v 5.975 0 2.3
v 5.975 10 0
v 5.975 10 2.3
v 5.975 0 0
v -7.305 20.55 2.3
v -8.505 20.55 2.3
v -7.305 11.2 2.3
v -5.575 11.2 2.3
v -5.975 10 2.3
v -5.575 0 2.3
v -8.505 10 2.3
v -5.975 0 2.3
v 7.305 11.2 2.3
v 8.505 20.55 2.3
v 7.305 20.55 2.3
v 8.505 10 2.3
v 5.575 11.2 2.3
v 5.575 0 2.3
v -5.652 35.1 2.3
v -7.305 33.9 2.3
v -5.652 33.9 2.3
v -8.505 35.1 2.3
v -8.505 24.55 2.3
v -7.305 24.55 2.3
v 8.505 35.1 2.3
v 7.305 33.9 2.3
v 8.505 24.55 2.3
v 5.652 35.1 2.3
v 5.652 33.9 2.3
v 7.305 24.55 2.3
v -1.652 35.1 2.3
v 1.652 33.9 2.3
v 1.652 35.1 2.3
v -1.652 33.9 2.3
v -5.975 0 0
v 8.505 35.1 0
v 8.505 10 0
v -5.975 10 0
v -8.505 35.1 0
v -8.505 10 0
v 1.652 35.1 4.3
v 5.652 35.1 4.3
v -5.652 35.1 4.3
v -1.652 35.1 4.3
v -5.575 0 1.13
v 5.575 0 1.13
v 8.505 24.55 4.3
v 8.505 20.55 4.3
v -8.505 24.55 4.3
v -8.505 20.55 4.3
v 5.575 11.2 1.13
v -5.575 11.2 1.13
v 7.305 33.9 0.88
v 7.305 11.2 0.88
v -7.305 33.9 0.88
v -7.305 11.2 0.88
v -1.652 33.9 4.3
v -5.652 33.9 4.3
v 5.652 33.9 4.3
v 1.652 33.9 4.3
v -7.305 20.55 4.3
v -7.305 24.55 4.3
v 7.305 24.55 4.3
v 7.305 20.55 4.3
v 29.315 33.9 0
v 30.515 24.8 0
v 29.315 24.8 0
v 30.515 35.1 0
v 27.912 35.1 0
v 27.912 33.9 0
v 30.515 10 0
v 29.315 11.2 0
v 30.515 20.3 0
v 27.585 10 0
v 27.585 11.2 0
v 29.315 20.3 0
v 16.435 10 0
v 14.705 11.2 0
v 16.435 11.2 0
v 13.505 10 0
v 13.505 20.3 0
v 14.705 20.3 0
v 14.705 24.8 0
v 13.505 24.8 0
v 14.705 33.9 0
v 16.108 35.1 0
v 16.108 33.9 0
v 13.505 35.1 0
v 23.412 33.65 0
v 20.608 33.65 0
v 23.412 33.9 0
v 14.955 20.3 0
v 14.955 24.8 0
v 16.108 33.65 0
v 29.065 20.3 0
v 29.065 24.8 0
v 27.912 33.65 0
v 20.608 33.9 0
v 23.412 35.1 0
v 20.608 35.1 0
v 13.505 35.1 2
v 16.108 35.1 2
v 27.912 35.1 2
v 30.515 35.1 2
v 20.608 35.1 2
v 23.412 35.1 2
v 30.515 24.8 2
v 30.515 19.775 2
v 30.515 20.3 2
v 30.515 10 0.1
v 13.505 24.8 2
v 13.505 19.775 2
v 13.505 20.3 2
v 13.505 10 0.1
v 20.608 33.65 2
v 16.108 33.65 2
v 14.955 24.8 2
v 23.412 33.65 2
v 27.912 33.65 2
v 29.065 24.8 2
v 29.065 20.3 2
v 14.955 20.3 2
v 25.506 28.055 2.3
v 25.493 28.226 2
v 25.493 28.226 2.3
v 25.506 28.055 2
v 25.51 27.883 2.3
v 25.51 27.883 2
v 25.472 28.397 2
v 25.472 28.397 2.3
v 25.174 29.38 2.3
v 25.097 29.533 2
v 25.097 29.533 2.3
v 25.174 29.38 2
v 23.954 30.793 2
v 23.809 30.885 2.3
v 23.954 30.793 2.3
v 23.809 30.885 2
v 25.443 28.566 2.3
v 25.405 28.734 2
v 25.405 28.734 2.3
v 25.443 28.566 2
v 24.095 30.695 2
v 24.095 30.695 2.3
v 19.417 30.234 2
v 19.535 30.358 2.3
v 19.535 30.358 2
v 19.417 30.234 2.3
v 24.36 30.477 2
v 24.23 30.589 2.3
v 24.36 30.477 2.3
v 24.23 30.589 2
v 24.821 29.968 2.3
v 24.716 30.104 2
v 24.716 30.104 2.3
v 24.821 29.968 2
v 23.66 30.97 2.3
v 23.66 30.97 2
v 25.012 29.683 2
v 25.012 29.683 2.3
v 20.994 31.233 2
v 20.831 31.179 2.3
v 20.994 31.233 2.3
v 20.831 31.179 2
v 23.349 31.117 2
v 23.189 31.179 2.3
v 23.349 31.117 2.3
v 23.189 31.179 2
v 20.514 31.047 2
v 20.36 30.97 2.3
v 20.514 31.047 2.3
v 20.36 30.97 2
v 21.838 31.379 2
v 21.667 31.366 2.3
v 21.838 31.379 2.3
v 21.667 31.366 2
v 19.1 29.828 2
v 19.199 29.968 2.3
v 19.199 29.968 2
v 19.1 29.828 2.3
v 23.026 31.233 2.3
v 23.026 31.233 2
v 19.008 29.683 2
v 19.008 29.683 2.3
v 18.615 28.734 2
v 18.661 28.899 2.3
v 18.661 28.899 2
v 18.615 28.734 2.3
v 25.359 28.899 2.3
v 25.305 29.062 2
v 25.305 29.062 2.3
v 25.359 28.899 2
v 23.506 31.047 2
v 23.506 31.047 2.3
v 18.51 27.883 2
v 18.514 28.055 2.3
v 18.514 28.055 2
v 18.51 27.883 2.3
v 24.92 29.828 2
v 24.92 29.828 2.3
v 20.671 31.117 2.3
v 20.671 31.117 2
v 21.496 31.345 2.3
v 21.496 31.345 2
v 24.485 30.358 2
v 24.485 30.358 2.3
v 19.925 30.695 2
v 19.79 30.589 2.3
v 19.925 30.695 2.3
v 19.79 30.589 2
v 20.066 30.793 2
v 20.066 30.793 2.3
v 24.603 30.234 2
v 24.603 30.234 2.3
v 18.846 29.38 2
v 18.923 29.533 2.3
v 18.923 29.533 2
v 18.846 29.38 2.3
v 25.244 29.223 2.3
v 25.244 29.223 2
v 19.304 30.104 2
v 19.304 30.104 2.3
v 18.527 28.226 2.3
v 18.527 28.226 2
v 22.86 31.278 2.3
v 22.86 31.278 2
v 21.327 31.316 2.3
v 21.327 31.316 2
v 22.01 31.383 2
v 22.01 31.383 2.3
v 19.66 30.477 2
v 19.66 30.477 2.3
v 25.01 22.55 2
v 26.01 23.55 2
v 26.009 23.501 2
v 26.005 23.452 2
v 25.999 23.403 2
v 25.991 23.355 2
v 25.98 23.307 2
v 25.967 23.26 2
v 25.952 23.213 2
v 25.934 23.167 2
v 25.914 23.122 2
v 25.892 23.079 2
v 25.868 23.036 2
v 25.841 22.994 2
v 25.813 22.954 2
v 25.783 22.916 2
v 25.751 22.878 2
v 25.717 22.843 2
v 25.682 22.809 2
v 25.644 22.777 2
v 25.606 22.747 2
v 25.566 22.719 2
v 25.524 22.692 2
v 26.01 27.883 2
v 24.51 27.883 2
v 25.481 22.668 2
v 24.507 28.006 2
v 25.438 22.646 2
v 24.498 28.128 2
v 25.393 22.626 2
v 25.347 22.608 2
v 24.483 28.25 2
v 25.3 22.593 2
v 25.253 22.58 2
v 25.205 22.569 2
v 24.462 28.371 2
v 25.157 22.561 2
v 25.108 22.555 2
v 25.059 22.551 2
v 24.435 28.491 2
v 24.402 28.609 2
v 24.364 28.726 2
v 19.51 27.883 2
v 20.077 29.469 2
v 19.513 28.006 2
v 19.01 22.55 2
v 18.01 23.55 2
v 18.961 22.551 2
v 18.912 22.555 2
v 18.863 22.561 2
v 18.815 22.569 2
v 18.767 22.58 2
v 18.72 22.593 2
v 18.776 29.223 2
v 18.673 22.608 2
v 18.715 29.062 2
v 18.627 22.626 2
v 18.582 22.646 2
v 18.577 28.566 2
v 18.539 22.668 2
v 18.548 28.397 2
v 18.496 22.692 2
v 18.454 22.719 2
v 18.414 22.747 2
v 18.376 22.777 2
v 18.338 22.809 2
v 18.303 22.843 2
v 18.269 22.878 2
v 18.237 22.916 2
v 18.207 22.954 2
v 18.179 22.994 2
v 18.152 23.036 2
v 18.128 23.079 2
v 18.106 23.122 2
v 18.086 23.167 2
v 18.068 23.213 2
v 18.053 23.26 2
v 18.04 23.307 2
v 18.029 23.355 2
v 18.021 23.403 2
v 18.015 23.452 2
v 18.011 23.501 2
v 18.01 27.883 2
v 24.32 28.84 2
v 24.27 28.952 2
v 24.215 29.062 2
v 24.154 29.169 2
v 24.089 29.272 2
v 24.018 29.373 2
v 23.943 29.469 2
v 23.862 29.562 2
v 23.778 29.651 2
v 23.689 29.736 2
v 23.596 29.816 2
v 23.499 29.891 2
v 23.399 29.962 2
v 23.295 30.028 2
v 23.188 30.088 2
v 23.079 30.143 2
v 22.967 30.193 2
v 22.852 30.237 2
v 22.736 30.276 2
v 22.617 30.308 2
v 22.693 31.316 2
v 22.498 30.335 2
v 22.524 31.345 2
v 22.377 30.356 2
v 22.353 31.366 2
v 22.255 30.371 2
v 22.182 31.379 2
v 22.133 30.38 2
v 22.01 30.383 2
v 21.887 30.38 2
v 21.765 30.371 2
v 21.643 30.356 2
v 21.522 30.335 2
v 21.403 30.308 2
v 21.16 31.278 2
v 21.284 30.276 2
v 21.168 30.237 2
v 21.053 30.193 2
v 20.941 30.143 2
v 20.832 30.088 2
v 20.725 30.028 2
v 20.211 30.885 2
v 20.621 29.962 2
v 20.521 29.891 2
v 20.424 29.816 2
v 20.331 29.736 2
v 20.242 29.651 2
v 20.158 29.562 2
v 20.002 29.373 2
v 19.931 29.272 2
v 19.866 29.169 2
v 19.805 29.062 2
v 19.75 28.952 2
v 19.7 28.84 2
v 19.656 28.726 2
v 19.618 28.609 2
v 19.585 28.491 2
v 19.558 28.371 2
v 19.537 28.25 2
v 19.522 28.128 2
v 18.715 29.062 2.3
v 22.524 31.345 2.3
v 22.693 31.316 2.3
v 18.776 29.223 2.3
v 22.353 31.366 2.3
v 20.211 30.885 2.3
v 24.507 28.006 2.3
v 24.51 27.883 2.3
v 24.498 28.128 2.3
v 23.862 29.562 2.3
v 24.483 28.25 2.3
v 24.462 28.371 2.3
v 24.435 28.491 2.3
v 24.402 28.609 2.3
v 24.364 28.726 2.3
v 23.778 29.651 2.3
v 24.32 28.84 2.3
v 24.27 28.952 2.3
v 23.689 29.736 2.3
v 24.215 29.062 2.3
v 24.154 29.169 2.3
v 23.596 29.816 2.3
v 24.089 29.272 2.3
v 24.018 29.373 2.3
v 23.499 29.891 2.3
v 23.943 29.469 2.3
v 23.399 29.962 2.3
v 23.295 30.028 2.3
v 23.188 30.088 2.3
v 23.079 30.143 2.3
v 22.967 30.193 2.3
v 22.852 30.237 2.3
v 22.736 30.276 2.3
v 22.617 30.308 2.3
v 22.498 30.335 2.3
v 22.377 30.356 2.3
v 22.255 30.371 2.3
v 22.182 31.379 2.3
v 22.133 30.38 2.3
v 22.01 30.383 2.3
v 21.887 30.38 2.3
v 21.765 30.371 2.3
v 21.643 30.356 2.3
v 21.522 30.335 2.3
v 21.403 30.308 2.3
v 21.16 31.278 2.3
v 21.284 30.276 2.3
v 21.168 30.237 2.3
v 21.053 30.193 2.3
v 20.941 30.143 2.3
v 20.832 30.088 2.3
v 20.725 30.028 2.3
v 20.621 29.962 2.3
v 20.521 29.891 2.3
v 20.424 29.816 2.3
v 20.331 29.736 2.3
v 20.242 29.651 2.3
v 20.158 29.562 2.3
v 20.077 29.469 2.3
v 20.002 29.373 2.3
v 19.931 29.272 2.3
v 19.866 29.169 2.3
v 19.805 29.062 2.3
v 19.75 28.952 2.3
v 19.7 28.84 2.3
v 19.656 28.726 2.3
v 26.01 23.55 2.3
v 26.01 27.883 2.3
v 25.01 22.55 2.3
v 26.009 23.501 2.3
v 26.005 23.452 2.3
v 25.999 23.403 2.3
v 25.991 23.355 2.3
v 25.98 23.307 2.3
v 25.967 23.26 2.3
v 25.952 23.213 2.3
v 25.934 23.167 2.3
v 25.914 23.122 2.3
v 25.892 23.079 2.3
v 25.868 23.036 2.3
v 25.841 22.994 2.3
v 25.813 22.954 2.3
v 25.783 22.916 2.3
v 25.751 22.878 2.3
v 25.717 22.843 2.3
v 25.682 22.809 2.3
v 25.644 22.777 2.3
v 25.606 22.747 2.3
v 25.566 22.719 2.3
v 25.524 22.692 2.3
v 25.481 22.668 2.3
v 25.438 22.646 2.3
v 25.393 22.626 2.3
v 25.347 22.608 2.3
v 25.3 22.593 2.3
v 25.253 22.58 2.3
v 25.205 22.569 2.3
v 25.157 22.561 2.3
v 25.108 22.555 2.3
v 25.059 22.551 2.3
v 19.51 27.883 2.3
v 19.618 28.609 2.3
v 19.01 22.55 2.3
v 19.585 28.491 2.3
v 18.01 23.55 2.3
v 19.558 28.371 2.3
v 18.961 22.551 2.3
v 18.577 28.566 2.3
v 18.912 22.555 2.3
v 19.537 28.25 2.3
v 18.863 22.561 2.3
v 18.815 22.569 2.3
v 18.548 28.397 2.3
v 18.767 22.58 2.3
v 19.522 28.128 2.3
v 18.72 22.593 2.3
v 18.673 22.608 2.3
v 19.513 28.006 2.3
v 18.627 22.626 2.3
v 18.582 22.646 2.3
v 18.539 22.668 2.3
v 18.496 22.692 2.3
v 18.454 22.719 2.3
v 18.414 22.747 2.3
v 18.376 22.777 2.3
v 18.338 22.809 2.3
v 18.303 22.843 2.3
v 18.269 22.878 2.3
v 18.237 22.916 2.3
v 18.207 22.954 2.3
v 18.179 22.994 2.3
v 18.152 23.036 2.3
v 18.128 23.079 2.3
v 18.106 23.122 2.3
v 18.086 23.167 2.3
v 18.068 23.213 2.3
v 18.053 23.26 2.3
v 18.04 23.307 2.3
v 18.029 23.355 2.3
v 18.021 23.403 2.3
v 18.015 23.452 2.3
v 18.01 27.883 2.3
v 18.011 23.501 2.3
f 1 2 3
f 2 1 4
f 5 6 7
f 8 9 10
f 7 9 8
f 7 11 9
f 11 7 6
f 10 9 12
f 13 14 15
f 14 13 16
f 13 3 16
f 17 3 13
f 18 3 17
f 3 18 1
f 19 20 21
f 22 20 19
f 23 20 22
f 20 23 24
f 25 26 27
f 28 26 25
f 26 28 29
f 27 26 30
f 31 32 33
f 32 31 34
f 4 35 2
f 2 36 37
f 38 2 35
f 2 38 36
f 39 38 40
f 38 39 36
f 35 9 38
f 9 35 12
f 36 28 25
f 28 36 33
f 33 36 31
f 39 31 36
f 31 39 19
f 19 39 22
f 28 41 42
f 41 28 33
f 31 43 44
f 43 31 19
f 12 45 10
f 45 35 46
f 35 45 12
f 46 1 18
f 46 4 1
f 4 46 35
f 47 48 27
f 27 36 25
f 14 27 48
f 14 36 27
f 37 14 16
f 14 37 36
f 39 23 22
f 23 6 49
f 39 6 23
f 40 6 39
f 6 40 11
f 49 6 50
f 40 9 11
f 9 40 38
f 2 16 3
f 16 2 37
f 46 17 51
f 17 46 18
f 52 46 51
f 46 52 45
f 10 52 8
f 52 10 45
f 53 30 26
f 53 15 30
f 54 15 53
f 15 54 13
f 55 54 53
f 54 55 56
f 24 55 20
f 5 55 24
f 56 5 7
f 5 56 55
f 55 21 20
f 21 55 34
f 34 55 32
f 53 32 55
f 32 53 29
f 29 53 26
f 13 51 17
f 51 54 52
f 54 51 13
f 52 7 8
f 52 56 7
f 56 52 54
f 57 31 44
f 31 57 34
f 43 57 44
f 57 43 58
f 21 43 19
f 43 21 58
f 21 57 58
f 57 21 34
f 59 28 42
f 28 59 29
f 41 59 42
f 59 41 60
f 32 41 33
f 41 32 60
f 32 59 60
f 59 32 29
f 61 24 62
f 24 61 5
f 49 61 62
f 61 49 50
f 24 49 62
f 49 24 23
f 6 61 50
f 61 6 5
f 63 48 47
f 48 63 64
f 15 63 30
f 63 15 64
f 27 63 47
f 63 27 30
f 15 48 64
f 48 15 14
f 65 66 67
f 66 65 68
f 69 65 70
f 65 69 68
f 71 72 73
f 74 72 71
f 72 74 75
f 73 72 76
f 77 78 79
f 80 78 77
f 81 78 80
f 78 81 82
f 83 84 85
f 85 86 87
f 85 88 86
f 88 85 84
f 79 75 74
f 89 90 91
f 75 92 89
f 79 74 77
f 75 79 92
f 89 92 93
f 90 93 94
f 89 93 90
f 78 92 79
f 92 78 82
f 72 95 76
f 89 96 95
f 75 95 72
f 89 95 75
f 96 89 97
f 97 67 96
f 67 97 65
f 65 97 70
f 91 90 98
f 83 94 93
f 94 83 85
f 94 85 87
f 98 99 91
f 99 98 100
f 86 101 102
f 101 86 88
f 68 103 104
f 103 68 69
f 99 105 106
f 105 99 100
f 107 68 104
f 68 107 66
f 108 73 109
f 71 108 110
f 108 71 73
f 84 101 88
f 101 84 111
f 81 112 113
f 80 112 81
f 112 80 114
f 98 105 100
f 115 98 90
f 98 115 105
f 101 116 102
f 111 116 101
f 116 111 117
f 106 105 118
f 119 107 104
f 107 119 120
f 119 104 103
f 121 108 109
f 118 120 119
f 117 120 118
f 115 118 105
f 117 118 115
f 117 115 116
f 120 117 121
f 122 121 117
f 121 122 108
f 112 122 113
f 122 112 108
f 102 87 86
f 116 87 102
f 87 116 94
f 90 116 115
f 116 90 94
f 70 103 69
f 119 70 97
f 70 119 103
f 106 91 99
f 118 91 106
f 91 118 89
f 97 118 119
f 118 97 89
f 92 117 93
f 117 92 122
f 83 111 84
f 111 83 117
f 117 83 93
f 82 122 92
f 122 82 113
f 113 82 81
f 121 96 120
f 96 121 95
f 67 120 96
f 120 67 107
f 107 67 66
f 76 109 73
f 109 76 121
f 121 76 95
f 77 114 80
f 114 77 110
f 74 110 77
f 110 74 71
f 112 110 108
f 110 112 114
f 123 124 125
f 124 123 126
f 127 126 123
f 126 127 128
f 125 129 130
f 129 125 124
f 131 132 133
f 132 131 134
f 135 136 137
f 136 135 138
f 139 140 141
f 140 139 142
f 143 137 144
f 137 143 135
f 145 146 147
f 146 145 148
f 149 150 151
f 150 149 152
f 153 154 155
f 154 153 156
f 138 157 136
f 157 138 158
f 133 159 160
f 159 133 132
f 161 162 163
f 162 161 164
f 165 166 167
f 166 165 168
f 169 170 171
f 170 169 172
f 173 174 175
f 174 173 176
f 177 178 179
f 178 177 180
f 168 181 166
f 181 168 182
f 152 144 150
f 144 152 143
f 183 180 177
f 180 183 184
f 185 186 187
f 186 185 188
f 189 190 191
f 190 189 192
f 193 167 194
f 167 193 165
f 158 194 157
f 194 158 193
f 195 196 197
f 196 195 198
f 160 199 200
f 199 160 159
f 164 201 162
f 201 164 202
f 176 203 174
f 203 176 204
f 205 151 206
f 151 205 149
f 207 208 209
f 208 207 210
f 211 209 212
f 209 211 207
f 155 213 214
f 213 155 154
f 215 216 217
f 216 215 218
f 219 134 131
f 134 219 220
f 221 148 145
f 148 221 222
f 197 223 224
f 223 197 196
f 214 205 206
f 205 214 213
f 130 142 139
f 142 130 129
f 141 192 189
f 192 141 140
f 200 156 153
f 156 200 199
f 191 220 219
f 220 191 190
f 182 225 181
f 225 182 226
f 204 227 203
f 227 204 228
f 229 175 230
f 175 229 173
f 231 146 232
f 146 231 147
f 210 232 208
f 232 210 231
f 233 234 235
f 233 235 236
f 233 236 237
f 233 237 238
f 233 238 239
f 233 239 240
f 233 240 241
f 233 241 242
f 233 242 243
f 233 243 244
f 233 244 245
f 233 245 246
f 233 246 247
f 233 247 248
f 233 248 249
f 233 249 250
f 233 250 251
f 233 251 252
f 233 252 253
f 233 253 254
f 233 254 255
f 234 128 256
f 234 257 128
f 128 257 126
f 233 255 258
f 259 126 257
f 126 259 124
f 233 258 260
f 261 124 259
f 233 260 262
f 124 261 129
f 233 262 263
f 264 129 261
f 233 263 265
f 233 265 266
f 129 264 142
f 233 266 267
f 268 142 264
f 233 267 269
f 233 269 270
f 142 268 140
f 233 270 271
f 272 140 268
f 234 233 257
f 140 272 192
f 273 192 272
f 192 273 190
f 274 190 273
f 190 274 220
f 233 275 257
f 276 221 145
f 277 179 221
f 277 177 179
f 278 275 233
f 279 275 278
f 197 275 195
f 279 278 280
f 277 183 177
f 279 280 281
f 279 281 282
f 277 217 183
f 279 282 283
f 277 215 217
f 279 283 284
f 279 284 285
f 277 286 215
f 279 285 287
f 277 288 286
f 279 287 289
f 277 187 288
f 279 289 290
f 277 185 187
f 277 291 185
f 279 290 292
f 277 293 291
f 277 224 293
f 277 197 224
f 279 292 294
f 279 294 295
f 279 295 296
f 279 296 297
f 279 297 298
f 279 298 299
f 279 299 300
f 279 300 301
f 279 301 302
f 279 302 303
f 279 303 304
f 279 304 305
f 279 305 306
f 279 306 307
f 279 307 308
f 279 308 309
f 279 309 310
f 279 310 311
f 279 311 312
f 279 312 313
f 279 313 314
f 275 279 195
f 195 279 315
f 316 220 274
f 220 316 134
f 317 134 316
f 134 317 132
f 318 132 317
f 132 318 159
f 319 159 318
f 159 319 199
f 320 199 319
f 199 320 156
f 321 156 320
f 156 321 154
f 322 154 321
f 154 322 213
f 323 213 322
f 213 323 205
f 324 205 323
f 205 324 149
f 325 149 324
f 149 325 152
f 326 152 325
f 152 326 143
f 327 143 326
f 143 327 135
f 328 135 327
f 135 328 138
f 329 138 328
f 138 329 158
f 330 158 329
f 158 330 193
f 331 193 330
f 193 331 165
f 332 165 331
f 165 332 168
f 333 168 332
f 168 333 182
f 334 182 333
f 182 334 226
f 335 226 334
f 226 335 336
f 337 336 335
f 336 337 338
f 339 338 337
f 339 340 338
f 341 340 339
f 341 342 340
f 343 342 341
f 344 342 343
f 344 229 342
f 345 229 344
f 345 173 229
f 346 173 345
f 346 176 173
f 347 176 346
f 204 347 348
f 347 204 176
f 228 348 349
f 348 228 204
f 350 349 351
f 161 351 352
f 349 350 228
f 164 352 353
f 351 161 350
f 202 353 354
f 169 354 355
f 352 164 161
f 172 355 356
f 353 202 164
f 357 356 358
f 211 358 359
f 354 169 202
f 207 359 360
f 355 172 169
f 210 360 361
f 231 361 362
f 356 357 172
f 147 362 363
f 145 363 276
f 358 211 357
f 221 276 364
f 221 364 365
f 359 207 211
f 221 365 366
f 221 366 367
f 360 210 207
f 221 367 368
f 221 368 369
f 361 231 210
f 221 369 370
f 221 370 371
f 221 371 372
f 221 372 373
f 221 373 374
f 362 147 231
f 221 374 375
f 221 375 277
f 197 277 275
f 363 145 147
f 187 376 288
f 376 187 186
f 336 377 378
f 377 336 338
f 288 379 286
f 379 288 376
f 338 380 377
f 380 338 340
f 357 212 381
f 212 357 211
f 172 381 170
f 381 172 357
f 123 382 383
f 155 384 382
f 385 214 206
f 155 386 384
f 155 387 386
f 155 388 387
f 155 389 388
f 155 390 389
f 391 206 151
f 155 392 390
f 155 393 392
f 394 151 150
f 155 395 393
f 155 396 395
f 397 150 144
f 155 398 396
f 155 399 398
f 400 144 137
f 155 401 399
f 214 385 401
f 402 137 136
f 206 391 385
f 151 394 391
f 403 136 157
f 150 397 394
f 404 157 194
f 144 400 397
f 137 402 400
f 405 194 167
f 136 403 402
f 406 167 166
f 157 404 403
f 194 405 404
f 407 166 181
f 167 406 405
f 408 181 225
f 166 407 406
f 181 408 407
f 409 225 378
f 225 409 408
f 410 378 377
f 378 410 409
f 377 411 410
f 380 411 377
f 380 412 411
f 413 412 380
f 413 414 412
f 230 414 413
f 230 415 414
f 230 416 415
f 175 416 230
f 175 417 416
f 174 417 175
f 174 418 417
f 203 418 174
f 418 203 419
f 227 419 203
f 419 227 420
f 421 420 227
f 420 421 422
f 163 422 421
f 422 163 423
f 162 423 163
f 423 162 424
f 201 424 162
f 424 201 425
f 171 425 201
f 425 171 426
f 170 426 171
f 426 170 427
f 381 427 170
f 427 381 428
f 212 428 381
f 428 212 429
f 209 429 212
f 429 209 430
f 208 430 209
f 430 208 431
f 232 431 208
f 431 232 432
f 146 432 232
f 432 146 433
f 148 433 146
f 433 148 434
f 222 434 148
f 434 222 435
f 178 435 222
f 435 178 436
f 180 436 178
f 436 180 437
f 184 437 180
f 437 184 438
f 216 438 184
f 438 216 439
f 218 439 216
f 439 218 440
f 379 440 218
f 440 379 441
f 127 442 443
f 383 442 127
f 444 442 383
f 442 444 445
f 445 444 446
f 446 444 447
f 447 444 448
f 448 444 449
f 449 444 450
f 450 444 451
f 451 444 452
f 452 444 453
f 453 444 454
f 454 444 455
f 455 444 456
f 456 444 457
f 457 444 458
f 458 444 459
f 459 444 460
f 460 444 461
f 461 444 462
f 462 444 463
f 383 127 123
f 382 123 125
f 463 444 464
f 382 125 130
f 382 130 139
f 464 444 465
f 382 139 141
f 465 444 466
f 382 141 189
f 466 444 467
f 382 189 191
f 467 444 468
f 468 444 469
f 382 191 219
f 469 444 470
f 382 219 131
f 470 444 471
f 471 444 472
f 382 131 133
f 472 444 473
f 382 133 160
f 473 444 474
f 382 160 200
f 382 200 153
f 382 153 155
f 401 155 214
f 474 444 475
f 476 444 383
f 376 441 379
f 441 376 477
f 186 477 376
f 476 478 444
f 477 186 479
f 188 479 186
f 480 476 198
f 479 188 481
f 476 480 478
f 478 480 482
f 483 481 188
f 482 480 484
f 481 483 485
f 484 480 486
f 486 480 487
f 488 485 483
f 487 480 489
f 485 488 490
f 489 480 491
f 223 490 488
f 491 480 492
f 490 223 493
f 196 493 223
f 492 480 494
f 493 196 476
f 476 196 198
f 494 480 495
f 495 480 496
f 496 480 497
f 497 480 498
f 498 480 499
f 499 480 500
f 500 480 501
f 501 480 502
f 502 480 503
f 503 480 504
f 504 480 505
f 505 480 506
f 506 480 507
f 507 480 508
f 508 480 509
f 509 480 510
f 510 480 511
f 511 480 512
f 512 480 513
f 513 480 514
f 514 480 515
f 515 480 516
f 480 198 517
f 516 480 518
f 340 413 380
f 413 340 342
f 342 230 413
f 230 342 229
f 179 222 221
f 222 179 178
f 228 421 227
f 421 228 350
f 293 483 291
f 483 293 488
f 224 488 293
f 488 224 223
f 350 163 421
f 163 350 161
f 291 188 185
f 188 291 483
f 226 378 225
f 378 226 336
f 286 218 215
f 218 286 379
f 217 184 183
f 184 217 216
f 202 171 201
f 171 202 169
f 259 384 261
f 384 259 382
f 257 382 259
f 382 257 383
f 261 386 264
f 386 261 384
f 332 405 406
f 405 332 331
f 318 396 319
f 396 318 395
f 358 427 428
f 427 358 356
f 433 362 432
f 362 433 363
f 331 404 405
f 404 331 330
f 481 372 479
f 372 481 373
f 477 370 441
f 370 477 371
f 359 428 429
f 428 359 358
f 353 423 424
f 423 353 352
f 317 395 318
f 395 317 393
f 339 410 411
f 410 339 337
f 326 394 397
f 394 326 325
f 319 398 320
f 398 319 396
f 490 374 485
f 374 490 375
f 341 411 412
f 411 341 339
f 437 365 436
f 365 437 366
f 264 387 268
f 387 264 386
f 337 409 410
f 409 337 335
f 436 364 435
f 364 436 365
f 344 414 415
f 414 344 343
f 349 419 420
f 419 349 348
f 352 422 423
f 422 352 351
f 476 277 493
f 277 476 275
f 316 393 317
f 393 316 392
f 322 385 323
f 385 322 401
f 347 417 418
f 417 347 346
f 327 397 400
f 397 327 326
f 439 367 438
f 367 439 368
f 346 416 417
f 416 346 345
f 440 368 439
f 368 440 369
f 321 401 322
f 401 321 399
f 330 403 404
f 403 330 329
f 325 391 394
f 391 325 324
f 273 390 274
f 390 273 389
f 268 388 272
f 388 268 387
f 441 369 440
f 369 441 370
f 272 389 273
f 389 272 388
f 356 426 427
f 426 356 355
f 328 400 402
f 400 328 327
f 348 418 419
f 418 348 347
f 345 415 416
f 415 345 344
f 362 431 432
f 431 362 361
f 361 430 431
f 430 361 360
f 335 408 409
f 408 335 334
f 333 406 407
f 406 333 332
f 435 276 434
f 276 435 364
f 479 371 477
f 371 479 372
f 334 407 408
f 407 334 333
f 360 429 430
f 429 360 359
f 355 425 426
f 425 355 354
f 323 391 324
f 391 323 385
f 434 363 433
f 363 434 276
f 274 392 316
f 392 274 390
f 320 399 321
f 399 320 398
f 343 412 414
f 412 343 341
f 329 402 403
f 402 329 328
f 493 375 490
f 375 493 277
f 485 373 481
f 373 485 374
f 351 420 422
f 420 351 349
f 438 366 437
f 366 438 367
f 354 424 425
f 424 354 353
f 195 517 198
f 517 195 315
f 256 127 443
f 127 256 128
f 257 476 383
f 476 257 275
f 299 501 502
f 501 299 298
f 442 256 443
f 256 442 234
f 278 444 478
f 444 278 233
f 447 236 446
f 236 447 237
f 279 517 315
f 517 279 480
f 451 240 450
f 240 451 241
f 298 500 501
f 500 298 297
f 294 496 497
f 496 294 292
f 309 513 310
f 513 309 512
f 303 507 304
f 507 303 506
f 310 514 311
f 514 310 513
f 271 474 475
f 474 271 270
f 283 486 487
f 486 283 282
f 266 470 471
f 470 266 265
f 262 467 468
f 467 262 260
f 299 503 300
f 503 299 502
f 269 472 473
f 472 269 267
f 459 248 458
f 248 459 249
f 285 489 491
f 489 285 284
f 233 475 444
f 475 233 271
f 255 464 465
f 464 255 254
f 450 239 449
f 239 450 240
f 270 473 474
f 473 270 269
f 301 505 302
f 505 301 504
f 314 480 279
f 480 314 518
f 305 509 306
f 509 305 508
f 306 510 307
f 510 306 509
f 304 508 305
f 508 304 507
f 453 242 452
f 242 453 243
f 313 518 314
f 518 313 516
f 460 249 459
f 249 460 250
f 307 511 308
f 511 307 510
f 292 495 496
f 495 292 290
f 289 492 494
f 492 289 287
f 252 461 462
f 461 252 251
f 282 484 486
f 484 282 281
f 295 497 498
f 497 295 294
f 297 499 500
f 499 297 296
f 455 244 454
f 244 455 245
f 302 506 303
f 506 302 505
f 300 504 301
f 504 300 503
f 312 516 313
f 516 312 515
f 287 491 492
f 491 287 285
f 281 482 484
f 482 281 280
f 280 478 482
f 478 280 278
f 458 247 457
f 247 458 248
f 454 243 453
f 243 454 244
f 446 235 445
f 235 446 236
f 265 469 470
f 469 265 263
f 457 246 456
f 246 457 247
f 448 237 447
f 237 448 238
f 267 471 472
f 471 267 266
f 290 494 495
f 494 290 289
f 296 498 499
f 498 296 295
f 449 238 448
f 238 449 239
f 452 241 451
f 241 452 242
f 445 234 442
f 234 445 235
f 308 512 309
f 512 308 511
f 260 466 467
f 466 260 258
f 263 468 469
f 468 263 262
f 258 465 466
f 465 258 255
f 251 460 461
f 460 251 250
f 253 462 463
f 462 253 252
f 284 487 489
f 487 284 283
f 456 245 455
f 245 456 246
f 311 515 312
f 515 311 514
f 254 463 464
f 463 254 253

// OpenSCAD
/* [Fine Tuning] */
//wiggle room (pcb)
w=0.5;
//Nozzle size (for single walls)
n=0.4;
//wiggle room (pegs)
wp=0.25;

/* [USB Size] */
//USB Tip X
utx=10.65;
usbTipX=utx+w;
//USB Body X
ubx=14.11;
usbBodyX=ubx+w;

usbTipY=11.2;
//USB Body Y
uby=22.2;
usbBodyY=uby+w;

usbTipZ=1.17;
usbBodyZ=1.42;

/* [Other] */
//Part to create
part = "Both Seperate"; // [Top,Bottom,Both Seperate,Both Together]
lockSymbol=true;
topHeight=2;

/* [Hidden] */
finalTipZ=2.3;
finalTipX=usbTipX+n*2;//12.05;
finalBodyX=usbBodyX+n*6;//16.5;
finalY=usbTipY+usbBodyY+n*3;
finalTipYPlugDepth=10;
$fn=128;

if (part=="Top") {
    caseTop();
} else if (part=="Bottom") {
    caseBottom();
} else if (part=="Both Together") {
    //#usb();
    caseBottom();
    caseTop();
} else if (part=="Both Seperate") {
    caseBottom();
    translate([finalBodyX+5,0,-finalTipZ])caseTop();
}

module usb(extraZ=0,extraY=0){
    union()translate([0,0,finalTipZ-usbBodyZ]){
        translate([-usbTipX/2,-extraY,usbBodyZ-usbTipZ])
        color("green")cube([usbTipX,usbTipY+0.1+extraY,usbTipZ+extraZ]);
        translate([-usbBodyX/2,usbTipY,0])color("darkgreen")cube([usbBodyX,usbBodyY,usbBodyZ+extraZ]);
    }
}

module caseBottom(wp=0){
    difference(){
        color("orange")
        union(){
            translate([-finalTipX/2,0,0])cube([finalTipX,finalY,finalTipZ]);
            translate([-finalBodyX/2,finalTipYPlugDepth,0])cube([finalBodyX,finalY-finalTipYPlugDepth,finalTipZ]);
        }
        usb();
        usb(extraZ=1,extraY=1);
    }
    pegWidth=4+wp*2;
    echo (pegWidth=pegWidth);
    for(i=[-1,1]){
        translate([-pegWidth/2+usbBodyX/4*i,finalY-((finalY-usbBodyY-usbTipY)/2)-(n*3)/2-wp,finalTipZ])
        cube([pegWidth,n*3+wp,topHeight]);
    }
    for(i=[-1,1]){
        translate([-(n*3+wp)/2+(usbBodyX/2+(n*3-wp)/2)*i,-pegWidth/2+usbTipY+usbBodyY/2,finalTipZ])
        cube([n*3+wp,pegWidth,topHeight]);
    }
}

module caseTop(){
    difference(){
            union(){
            translate([-finalBodyX/2,finalTipYPlugDepth,finalTipZ])cube([finalBodyX,finalY-finalTipYPlugDepth,topHeight]);
        }
        translate([-(finalBodyX+1)/2,finalTipYPlugDepth,finalTipZ+0.1])rotate([11,0,0])cube([finalBodyX+1,usbBodyY/2,topHeight]);
        caseBottom(wp=wp);
    }
    //Lock symbol
    if (lockSymbol) {
        lockSize=8;
        lockHeight=0.3;
        cornerRad=1;
        color("orange")translate([-lockSize/2,usbTipY+usbBodyY-(usbBodyY/2),finalTipZ+topHeight]){
            hull(){
                translate([0,lockSize/3*2-cornerRad,0])cube([lockSize,cornerRad,lockHeight]);
                translate([cornerRad,cornerRad,0])cylinder(r=cornerRad,h=lockHeight);
                translate([lockSize-cornerRad,cornerRad,0])cylinder(r=cornerRad,h=lockHeight);
            }
            translate([lockSize/2,lockSize/3*2,0]) {
                difference(){
                    cylinder(r=lockSize/2-cornerRad/2,h=lockHeight);
                    cylinder(r=lockSize/2-cornerRad/2-1,h=lockHeight+0.1);
                }
            }
        }
    }
}
